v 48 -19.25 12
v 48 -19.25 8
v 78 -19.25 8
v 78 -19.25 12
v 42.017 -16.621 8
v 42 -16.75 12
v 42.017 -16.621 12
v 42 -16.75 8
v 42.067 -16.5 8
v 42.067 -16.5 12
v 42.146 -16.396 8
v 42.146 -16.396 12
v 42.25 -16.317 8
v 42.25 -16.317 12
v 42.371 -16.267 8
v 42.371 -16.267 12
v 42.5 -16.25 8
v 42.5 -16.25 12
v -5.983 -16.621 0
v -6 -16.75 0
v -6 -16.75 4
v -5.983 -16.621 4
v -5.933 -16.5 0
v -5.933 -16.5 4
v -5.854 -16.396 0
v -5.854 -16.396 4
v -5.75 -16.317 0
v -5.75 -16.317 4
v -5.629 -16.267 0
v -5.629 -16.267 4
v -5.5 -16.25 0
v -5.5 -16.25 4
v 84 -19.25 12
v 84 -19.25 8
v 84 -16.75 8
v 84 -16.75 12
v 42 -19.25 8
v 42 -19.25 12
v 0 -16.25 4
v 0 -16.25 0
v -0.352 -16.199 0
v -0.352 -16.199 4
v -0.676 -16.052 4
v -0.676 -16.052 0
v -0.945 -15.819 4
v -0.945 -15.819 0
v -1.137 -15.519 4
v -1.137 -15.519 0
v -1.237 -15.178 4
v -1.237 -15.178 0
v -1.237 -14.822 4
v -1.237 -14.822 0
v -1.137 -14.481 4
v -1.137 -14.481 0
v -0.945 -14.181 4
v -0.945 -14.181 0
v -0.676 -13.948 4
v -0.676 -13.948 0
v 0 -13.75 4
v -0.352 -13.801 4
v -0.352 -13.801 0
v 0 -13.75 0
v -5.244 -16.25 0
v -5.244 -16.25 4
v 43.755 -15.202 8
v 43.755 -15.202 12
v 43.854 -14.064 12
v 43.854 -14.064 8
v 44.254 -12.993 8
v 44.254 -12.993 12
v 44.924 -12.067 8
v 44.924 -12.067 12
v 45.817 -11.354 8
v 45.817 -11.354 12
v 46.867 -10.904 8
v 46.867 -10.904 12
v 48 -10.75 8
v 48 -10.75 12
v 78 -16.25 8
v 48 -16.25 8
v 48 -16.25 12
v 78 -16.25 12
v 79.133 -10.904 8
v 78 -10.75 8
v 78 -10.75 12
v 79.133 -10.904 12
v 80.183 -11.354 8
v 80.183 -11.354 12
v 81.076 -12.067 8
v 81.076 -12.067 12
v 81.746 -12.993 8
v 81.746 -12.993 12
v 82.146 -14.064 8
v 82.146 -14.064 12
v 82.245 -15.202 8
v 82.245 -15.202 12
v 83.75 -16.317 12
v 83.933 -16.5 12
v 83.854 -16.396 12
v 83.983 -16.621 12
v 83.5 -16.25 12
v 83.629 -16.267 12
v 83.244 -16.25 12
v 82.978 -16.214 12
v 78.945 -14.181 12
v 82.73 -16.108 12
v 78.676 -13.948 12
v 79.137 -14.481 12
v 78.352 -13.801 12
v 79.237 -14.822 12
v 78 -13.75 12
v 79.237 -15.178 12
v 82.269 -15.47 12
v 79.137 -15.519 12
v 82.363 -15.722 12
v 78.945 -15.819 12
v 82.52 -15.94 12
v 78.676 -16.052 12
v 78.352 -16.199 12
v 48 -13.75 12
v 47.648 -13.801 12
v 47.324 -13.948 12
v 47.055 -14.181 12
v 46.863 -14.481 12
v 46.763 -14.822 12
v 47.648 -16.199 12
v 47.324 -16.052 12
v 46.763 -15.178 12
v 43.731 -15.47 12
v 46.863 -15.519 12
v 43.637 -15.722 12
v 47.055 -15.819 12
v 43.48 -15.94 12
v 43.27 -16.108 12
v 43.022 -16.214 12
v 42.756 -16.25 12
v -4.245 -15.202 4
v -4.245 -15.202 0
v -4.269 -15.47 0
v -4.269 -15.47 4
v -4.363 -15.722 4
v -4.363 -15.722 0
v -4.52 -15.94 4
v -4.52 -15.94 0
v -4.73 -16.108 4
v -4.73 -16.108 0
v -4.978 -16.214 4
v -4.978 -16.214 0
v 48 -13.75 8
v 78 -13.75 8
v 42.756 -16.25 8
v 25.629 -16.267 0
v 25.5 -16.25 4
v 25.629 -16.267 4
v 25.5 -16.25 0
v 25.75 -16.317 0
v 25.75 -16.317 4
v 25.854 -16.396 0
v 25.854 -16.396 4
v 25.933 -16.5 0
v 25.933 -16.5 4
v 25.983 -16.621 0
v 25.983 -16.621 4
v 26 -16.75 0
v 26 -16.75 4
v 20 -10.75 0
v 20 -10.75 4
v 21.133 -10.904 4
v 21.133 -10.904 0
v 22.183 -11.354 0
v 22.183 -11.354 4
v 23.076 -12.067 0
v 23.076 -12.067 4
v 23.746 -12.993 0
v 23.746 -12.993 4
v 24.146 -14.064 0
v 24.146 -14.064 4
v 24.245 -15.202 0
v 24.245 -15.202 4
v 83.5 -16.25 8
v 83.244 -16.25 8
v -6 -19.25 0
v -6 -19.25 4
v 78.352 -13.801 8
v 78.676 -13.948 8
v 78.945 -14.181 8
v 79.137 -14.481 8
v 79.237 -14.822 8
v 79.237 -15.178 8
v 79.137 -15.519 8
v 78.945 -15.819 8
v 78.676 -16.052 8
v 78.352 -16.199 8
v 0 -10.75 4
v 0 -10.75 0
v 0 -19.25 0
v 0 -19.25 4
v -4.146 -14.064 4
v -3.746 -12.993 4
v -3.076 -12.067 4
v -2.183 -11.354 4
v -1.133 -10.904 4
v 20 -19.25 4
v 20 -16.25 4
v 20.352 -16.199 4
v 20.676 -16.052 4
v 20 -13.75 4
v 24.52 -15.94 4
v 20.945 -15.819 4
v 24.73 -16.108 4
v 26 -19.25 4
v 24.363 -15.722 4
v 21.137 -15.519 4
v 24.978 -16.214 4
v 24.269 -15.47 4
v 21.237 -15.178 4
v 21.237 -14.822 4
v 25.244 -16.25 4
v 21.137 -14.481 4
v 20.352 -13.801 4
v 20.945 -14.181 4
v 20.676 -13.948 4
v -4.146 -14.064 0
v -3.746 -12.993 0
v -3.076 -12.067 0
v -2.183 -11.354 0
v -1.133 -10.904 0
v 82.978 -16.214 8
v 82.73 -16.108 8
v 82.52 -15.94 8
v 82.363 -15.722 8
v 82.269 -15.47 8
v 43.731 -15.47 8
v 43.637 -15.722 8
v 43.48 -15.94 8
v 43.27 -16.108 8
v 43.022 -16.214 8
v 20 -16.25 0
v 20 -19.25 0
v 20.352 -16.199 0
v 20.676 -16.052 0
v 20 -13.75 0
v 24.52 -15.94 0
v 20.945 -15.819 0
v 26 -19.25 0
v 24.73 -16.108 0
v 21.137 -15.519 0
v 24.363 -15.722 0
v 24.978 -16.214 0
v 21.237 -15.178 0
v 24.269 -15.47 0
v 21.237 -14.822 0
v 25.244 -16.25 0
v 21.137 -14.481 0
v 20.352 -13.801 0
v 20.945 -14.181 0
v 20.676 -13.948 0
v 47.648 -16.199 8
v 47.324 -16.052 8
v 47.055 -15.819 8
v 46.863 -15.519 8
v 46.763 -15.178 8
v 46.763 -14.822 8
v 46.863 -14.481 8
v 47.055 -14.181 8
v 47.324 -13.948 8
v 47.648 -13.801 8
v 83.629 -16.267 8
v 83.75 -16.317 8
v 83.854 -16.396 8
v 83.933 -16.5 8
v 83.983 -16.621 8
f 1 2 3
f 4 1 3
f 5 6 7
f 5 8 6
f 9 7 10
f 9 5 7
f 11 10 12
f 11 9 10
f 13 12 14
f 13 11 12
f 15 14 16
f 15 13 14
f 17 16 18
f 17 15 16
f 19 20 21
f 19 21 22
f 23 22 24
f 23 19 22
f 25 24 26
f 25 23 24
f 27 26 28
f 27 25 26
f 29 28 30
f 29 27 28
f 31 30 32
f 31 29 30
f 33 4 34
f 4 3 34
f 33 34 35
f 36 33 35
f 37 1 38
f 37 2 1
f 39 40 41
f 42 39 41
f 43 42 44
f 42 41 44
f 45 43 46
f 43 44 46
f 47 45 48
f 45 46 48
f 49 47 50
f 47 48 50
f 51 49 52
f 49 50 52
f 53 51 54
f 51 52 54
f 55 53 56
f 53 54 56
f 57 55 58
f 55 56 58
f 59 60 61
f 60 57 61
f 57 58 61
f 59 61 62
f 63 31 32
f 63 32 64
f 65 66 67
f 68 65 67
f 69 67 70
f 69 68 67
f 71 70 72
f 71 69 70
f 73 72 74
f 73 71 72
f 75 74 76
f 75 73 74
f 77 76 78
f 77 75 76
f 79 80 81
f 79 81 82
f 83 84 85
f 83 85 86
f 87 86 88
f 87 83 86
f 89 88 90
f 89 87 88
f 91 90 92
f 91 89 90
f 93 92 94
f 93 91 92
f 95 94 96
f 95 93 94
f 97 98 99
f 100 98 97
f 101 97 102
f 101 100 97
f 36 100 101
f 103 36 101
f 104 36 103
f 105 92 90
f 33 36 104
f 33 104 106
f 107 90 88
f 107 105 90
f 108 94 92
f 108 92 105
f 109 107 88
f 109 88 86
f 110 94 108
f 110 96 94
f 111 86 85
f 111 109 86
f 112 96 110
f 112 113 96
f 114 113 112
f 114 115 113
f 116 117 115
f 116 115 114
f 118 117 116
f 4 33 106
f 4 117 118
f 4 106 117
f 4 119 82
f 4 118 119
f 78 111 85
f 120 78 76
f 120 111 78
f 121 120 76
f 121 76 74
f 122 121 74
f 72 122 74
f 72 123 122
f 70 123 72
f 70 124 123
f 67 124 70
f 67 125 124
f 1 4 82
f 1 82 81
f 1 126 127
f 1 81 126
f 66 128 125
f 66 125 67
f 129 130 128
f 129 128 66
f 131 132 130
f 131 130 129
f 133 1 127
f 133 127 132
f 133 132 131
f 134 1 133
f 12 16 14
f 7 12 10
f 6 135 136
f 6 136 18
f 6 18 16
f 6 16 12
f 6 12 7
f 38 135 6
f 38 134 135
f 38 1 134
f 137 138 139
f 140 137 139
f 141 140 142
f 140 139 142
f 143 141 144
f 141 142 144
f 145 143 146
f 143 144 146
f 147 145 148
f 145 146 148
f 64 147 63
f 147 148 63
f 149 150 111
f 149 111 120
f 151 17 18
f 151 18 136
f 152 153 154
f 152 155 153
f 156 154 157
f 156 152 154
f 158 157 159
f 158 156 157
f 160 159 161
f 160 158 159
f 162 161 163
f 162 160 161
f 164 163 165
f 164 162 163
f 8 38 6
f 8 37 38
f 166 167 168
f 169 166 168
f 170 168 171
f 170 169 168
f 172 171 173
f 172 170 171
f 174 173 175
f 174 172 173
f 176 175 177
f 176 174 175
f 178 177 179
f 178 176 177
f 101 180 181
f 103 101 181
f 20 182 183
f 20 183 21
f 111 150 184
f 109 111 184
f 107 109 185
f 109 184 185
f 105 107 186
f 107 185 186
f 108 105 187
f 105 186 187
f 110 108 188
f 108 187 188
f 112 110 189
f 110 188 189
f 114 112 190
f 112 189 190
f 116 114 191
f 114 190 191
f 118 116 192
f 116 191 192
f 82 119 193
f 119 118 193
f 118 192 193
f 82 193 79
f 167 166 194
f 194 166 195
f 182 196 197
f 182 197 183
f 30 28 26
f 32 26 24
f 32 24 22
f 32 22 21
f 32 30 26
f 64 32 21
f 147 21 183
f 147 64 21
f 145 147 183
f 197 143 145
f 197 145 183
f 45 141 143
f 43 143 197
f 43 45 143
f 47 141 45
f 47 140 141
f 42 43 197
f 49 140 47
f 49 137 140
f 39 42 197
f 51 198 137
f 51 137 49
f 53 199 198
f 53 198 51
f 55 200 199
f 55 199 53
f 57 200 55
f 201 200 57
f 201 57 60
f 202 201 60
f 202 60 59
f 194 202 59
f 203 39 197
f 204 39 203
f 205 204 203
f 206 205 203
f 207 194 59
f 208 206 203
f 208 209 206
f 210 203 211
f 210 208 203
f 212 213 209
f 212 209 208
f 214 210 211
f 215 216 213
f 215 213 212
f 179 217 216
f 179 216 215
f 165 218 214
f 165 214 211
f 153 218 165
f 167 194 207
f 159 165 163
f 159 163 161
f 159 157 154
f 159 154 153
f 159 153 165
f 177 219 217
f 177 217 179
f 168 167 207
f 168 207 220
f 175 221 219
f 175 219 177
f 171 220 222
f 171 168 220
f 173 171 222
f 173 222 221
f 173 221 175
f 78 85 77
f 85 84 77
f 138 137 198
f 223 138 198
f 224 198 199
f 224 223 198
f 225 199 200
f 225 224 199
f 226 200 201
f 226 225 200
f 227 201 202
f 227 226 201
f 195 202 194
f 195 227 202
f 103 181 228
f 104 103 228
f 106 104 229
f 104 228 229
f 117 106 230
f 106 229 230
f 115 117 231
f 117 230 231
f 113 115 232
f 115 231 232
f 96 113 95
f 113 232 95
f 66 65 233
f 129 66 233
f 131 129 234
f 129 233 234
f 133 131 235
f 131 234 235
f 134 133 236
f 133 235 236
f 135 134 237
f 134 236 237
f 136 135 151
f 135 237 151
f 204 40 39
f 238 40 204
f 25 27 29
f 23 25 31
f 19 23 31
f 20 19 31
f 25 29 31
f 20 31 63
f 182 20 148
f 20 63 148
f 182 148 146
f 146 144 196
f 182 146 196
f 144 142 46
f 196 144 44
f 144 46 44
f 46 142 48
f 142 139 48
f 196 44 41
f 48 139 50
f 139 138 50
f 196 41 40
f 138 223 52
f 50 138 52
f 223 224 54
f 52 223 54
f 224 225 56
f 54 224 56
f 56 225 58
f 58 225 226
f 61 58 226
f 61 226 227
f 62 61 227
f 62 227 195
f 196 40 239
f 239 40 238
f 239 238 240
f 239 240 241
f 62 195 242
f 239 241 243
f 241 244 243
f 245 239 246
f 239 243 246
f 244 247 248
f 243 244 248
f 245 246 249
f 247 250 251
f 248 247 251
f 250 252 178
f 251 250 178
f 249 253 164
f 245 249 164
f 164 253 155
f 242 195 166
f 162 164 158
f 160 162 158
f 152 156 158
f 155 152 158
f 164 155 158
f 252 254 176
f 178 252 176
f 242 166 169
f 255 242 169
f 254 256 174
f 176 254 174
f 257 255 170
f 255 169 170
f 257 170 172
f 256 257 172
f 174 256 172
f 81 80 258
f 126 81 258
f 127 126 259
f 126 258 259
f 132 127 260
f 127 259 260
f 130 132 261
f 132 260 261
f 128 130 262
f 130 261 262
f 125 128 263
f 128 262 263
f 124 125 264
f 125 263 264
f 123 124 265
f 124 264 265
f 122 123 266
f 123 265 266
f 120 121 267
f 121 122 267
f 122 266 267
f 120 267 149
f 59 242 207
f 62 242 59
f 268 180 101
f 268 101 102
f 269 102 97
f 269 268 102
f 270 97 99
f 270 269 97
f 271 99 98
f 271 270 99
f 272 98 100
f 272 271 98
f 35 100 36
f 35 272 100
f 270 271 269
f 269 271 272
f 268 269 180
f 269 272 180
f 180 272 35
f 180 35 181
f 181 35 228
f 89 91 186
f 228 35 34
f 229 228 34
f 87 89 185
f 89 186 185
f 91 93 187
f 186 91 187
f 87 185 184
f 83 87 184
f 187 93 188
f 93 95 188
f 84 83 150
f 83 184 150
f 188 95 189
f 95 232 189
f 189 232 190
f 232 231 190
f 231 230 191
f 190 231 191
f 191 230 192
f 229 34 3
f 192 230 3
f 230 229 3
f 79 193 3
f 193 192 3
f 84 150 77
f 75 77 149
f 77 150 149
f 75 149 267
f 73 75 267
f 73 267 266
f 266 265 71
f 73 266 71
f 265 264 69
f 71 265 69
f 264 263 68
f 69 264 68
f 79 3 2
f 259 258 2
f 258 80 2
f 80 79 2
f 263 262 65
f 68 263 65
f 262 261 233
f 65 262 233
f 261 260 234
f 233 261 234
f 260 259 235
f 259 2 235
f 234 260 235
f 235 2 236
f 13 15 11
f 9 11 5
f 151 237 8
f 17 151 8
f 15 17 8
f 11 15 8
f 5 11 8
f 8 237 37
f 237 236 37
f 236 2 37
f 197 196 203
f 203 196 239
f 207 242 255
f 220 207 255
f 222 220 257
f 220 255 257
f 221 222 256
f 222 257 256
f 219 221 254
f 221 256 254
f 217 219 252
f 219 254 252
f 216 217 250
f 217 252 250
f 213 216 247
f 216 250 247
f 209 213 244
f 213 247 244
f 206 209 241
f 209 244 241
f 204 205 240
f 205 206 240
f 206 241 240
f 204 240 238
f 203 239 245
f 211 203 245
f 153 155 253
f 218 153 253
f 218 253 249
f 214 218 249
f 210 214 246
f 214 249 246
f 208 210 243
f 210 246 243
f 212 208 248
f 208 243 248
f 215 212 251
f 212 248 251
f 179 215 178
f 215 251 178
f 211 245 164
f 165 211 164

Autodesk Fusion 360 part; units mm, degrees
sketch "Sketch1" plane through (0, 0, 0) normal (0, 0, 1) x (1, 0, 0)
sketch "Sketch2" plane through (0, 0, 4) normal (0, 0, 1) x (-1, 0, 0)
  line L0 (-20, 1.25) -> (0, 1.25)
  arc A0 (0, -1.25) -> (0, 1.25) centre (0, 0) ccw
  line L1 (0, -1.25) -> (-20, -1.25)
  arc A1 (-20, 1.25) -> (-20, -1.25) centre (-20, 0) ccw
  line L2 (6, 4.25) -> (-26, 4.25)
  line L3 (-26, 4.25) -> (-26, 2.25)
  arc A2 (-26, 2.25) -> (-25, 1.25) centre (-25, 2.25) ccw
  line L4 (-25, 1.25) -> (-25.244, 1.25)
  arc A3 (-24.2452, 0.2024) -> (-25.244, 1.25) centre (-25.244, 0.25) ccw
  arc A4 (-24.2452, 0.2024) -> (-20, -4.25) centre (-20, 0) ccw
  line L5 (-20, -4.25) -> (0, -4.25)
  arc A5 (0, -4.25) -> (4.244, 0.2261) centre (0, 0) ccw
  arc A6 (5.2426, 1.2793) -> (4.244, 0.2261) centre (5.2426, 0.2793) ccw
  line L6 (5.2426, 1.2793) -> (5, 1.2793)
  arc A7 (5, 1.2793) -> (6, 2.2793) centre (5, 2.2793) ccw
  line L7 (6, 2.2793) -> (6, 4.25)
  line L8 (-75, -1.25) -> (-45, -1.25)
  arc A8 (-45, -1.25) -> (-45, 1.25) centre (-45, 0) ccw
  line L9 (-45, 1.25) -> (-75, 1.25)
  arc A9 (-75, 1.25) -> (-75, -1.25) centre (-75, 0) ccw
  line L10 (-75, 0) -> (-45, 0) construction
  line L11 (-45, 4.25) -> (-75, 4.25)
  arc A10 (-79.2452, 0.2024) -> (-75, -4.25) centre (-75, 0) ccw
  line L12 (-75, -4.25) -> (-45, -4.25)
  arc A11 (-45, -4.25) -> (-40.7548, 0.2024) centre (-45, 0) ccw
  line L13 (-75, 4.25) -> (-81, 4.25)
  line L14 (-81, 4.25) -> (-81, 2.25)
  line L15 (-80, 1.25) -> (-80.244, 1.25)
  line L16 (-45, 4.25) -> (-39, 4.25)
  line L17 (-39, 4.25) -> (-39, 2.25)
  line L18 (-40, 1.25) -> (-39.756, 1.25)
  arc A12 (-39.756, 1.25) -> (-40.7548, 0.2024) centre (-39.756, 0.25) ccw
  arc A13 (-40, 1.25) -> (-39, 2.25) centre (-40, 2.25) ccw
  arc A14 (-81, 2.25) -> (-80, 1.25) centre (-80, 2.25) ccw
  arc A15 (-79.2452, 0.2024) -> (-80.244, 1.25) centre (-80.244, 0.25) ccw
  dimension "d24" = 2.5
  dimension "d26" = 6
  dimension "d28" = 6
  dimension "d30" = 1
  dimension "d31" = 1
  dimension "d32" = 1
  dimension "d33" = 1
sketch "Sketch3" plane through (0, 0, 8) normal (0, 0, 1) x (-1, 0, 0)
  arc A0 (-75, 1.25) -> (-75, -1.25) centre (-75, 0) ccw
  line L0 (-75, 1.25) -> (-45, 1.25)
  arc A1 (-45, -1.25) -> (-45, 1.25) centre (-45, 0) ccw
  line L1 (-45, -1.25) -> (-75, -1.25)
  line L2 (-75, -4.25) -> (-45, -4.25)
  arc A2 (-45, -4.25) -> (-40.7548, 0.2024) centre (-45, 0) ccw
  arc A3 (-39.756, 1.25) -> (-40.7548, 0.2024) centre (-39.756, 0.25) ccw
  line L3 (-39.756, 1.25) -> (-40, 1.25)
  arc A4 (-40, 1.25) -> (-39, 2.25) centre (-40, 2.25) ccw
  line L4 (-39, 2.25) -> (-39, 4.25)
  line L5 (-39, 4.25) -> (-81, 4.25)
  line L6 (-81, 4.25) -> (-81, 2.25)
  arc A5 (-81, 2.25) -> (-80, 1.25) centre (-80, 2.25) ccw
  line L7 (-80, 1.25) -> (-80.244, 1.25)
  arc A6 (-79.2452, 0.2024) -> (-80.244, 1.25) centre (-80.244, 0.25) ccw
  arc A7 (-79.2452, 0.2024) -> (-75, -4.25) centre (-75, 0) ccw
  line L8 (-78, 13.75) -> (-48, 13.75)
  arc A8 (-48, 13.75) -> (-48, 16.25) centre (-48, 15) ccw
  line L9 (-48, 16.25) -> (-78, 16.25)
  arc A9 (-78, 16.25) -> (-78, 13.75) centre (-78, 15) ccw
  line L10 (-78, 15) -> (-48, 15) construction
  line L11 (-48, 19.25) -> (-78, 19.25)
  arc A10 (-82.2452, 15.2024) -> (-78, 10.75) centre (-78, 15) ccw
  line L12 (-78, 10.75) -> (-48, 10.75)
  arc A11 (-48, 10.75) -> (-43.7548, 15.2024) centre (-48, 15) ccw
  line L13 (-48, 19.25) -> (-42, 19.25)
  line L14 (-42, 19.25) -> (-42, 16.75)
  line L15 (-42.5, 16.25) -> (-42.756, 16.25)
  line L16 (-78, 19.25) -> (-84, 19.25)
  line L17 (-84, 19.25) -> (-84, 16.75)
  line L18 (-83.5, 16.25) -> (-83.244, 16.25)
  arc A12 (-42.756, 16.25) -> (-43.7548, 15.2024) centre (-42.756, 15.25) ccw
  arc A13 (-42.5, 16.25) -> (-42, 16.75) centre (-42.5, 16.75) ccw
  arc A14 (-82.2452, 15.2024) -> (-83.244, 16.25) centre (-83.244, 15.25) ccw
  arc A15 (-84, 16.75) -> (-83.5, 16.25) centre (-83.5, 16.75) ccw
  dimension "d36" = 2.5
  dimension "d38" = 6
  dimension "d40" = 6
  dimension "d42" = 1
  dimension "d43" = 0.5
  dimension "d44" = 1
  dimension "d45" = 0.5
extrude "Extrude3" add sketch "Sketch3" along normal blind 4 contours L11 A10 L12 A11 L13 L14 L15 L16 L17 L18 A12 A13 A14 A15 makes body 1
sketch "Sketch4" plane through (0, 0, 0) normal (0, 0, 1) x (1, 0, 0)
  line L0 (0, -16.25) -> (20, -16.25)
  arc A0 (20, -16.25) -> (20, -13.75) centre (20, -15) ccw
  line L1 (20, -13.75) -> (0, -13.75)
  arc A1 (0, -13.75) -> (0, -16.25) centre (0, -15) ccw
  line L2 (0, -15) -> (20, -15) construction
  line L3 (0, -19.25) -> (20, -19.25)
  arc A2 (24.2452, -15.2024) -> (20, -10.75) centre (20, -15) ccw
  line L4 (20, -10.75) -> (0, -10.75)
  arc A3 (0, -10.75) -> (-4.2452, -15.2024) centre (0, -15) ccw
  line L5 (0, -19.25) -> (-6, -19.25)
  line L6 (-6, -19.25) -> (-6, -16.75)
  line L7 (-5.5, -16.25) -> (-5.244, -16.25)
  line L8 (20, -19.25) -> (26, -19.25)
  line L9 (26, -19.25) -> (26, -16.75)
  line L10 (25.5, -16.25) -> (25.244, -16.25)
  arc A4 (24.2452, -15.2024) -> (25.244, -16.25) centre (25.244, -15.25) ccw
  arc A5 (-5.244, -16.25) -> (-4.2452, -15.2024) centre (-5.244, -15.25) ccw
  arc A6 (26, -16.75) -> (25.5, -16.25) centre (25.5, -16.75) ccw
  arc A7 (-5.5, -16.25) -> (-6, -16.75) centre (-5.5, -16.75) ccw
  dimension "d48" = 2.5
  dimension "d50" = 6
  dimension "d52" = 6
  dimension "d54" = 1
  dimension "d55" = 1
  dimension "d56" = 0.5
  dimension "d57" = 0.5
extrude "Extrude4" add sketch "Sketch4" along normal blind 4 separate body makes body 2
